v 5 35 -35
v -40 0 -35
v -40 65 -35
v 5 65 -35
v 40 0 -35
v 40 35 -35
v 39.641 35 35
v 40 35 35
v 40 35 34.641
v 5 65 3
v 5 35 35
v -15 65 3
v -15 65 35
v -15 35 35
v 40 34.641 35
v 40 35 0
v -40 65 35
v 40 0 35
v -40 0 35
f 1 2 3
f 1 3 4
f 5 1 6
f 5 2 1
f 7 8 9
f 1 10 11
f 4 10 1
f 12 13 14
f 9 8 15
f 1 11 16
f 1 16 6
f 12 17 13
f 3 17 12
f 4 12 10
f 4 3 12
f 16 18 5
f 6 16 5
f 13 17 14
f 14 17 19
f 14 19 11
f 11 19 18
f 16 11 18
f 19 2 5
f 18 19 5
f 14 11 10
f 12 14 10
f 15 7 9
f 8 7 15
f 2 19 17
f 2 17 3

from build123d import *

# Parameters (mm, degrees)
SKETCH2_W           = 80
SKETCH2_H           = 70
BOSS_EXTRUDE1_DEPTH = 65
SKETCH3_W           = 70
SKETCH3_H           = 30
CUT_EXTRUDE1_DEPTH  = 35
BOSS_EXTRUDE2_DEPTH = 20
CUT_EXTRUDE2_DEPTH  = 20
CUT_EXTRUDE3_DEPTH  = 20


with BuildPart() as part:
    # Sketch2 → Boss-Extrude1 (new body)
    with BuildSketch(Plane(origin=(0, 0, 0), x_dir=(1, 0, 0), z_dir=(0, 1, 0))):
        Rectangle(SKETCH2_W, SKETCH2_H)
    extrude(amount=BOSS_EXTRUDE1_DEPTH)

    # Sketch3 → Cut-Extrude1 (cut)
    with BuildSketch(Plane(origin=(40, 0, 0), x_dir=(0, 0, -1), z_dir=(1, 0, 0))):
        with Locations((0, 50)):
            Rectangle(SKETCH3_W, SKETCH3_H)
    extrude(amount=-CUT_EXTRUDE1_DEPTH, mode=Mode.SUBTRACT)

    # Sketch4 → Boss-Extrude2 (add)
    with BuildSketch(Plane(origin=(5, 0, 0), x_dir=(0, 0, -1), z_dir=(1, 0, 0))):
        Polygon((-35, 35), (-3, 65), (-35, 65), align=None)
    extrude(amount=-BOSS_EXTRUDE2_DEPTH)

    # Sketch5 → Cut-Extrude2 (cut)
    with BuildSketch(Plane(origin=(5, 0, 0), x_dir=(0, 0, -1), z_dir=(1, 0, 0))):
        Polygon((-35, 35), (-3, 65), (-35, 65), align=None)
    extrude(amount=-CUT_EXTRUDE2_DEPTH, mode=Mode.SUBTRACT)

    # Sketch6 → Cut-Extrude3 (cut)
    with BuildSketch(Plane(origin=(25, 25, 25), x_dir=(-0.816496581, 0.40824829, 0.40824829), z_dir=(-0.577350269, -0.577350269, -0.577350269))):
        Polygon((-18.371173071, -24.748737342), (-18.371173071, 24.748737342), (24.494897428, 0), align=None)
    extrude(amount=-CUT_EXTRUDE3_DEPTH, mode=Mode.SUBTRACT)


solid = part.part
